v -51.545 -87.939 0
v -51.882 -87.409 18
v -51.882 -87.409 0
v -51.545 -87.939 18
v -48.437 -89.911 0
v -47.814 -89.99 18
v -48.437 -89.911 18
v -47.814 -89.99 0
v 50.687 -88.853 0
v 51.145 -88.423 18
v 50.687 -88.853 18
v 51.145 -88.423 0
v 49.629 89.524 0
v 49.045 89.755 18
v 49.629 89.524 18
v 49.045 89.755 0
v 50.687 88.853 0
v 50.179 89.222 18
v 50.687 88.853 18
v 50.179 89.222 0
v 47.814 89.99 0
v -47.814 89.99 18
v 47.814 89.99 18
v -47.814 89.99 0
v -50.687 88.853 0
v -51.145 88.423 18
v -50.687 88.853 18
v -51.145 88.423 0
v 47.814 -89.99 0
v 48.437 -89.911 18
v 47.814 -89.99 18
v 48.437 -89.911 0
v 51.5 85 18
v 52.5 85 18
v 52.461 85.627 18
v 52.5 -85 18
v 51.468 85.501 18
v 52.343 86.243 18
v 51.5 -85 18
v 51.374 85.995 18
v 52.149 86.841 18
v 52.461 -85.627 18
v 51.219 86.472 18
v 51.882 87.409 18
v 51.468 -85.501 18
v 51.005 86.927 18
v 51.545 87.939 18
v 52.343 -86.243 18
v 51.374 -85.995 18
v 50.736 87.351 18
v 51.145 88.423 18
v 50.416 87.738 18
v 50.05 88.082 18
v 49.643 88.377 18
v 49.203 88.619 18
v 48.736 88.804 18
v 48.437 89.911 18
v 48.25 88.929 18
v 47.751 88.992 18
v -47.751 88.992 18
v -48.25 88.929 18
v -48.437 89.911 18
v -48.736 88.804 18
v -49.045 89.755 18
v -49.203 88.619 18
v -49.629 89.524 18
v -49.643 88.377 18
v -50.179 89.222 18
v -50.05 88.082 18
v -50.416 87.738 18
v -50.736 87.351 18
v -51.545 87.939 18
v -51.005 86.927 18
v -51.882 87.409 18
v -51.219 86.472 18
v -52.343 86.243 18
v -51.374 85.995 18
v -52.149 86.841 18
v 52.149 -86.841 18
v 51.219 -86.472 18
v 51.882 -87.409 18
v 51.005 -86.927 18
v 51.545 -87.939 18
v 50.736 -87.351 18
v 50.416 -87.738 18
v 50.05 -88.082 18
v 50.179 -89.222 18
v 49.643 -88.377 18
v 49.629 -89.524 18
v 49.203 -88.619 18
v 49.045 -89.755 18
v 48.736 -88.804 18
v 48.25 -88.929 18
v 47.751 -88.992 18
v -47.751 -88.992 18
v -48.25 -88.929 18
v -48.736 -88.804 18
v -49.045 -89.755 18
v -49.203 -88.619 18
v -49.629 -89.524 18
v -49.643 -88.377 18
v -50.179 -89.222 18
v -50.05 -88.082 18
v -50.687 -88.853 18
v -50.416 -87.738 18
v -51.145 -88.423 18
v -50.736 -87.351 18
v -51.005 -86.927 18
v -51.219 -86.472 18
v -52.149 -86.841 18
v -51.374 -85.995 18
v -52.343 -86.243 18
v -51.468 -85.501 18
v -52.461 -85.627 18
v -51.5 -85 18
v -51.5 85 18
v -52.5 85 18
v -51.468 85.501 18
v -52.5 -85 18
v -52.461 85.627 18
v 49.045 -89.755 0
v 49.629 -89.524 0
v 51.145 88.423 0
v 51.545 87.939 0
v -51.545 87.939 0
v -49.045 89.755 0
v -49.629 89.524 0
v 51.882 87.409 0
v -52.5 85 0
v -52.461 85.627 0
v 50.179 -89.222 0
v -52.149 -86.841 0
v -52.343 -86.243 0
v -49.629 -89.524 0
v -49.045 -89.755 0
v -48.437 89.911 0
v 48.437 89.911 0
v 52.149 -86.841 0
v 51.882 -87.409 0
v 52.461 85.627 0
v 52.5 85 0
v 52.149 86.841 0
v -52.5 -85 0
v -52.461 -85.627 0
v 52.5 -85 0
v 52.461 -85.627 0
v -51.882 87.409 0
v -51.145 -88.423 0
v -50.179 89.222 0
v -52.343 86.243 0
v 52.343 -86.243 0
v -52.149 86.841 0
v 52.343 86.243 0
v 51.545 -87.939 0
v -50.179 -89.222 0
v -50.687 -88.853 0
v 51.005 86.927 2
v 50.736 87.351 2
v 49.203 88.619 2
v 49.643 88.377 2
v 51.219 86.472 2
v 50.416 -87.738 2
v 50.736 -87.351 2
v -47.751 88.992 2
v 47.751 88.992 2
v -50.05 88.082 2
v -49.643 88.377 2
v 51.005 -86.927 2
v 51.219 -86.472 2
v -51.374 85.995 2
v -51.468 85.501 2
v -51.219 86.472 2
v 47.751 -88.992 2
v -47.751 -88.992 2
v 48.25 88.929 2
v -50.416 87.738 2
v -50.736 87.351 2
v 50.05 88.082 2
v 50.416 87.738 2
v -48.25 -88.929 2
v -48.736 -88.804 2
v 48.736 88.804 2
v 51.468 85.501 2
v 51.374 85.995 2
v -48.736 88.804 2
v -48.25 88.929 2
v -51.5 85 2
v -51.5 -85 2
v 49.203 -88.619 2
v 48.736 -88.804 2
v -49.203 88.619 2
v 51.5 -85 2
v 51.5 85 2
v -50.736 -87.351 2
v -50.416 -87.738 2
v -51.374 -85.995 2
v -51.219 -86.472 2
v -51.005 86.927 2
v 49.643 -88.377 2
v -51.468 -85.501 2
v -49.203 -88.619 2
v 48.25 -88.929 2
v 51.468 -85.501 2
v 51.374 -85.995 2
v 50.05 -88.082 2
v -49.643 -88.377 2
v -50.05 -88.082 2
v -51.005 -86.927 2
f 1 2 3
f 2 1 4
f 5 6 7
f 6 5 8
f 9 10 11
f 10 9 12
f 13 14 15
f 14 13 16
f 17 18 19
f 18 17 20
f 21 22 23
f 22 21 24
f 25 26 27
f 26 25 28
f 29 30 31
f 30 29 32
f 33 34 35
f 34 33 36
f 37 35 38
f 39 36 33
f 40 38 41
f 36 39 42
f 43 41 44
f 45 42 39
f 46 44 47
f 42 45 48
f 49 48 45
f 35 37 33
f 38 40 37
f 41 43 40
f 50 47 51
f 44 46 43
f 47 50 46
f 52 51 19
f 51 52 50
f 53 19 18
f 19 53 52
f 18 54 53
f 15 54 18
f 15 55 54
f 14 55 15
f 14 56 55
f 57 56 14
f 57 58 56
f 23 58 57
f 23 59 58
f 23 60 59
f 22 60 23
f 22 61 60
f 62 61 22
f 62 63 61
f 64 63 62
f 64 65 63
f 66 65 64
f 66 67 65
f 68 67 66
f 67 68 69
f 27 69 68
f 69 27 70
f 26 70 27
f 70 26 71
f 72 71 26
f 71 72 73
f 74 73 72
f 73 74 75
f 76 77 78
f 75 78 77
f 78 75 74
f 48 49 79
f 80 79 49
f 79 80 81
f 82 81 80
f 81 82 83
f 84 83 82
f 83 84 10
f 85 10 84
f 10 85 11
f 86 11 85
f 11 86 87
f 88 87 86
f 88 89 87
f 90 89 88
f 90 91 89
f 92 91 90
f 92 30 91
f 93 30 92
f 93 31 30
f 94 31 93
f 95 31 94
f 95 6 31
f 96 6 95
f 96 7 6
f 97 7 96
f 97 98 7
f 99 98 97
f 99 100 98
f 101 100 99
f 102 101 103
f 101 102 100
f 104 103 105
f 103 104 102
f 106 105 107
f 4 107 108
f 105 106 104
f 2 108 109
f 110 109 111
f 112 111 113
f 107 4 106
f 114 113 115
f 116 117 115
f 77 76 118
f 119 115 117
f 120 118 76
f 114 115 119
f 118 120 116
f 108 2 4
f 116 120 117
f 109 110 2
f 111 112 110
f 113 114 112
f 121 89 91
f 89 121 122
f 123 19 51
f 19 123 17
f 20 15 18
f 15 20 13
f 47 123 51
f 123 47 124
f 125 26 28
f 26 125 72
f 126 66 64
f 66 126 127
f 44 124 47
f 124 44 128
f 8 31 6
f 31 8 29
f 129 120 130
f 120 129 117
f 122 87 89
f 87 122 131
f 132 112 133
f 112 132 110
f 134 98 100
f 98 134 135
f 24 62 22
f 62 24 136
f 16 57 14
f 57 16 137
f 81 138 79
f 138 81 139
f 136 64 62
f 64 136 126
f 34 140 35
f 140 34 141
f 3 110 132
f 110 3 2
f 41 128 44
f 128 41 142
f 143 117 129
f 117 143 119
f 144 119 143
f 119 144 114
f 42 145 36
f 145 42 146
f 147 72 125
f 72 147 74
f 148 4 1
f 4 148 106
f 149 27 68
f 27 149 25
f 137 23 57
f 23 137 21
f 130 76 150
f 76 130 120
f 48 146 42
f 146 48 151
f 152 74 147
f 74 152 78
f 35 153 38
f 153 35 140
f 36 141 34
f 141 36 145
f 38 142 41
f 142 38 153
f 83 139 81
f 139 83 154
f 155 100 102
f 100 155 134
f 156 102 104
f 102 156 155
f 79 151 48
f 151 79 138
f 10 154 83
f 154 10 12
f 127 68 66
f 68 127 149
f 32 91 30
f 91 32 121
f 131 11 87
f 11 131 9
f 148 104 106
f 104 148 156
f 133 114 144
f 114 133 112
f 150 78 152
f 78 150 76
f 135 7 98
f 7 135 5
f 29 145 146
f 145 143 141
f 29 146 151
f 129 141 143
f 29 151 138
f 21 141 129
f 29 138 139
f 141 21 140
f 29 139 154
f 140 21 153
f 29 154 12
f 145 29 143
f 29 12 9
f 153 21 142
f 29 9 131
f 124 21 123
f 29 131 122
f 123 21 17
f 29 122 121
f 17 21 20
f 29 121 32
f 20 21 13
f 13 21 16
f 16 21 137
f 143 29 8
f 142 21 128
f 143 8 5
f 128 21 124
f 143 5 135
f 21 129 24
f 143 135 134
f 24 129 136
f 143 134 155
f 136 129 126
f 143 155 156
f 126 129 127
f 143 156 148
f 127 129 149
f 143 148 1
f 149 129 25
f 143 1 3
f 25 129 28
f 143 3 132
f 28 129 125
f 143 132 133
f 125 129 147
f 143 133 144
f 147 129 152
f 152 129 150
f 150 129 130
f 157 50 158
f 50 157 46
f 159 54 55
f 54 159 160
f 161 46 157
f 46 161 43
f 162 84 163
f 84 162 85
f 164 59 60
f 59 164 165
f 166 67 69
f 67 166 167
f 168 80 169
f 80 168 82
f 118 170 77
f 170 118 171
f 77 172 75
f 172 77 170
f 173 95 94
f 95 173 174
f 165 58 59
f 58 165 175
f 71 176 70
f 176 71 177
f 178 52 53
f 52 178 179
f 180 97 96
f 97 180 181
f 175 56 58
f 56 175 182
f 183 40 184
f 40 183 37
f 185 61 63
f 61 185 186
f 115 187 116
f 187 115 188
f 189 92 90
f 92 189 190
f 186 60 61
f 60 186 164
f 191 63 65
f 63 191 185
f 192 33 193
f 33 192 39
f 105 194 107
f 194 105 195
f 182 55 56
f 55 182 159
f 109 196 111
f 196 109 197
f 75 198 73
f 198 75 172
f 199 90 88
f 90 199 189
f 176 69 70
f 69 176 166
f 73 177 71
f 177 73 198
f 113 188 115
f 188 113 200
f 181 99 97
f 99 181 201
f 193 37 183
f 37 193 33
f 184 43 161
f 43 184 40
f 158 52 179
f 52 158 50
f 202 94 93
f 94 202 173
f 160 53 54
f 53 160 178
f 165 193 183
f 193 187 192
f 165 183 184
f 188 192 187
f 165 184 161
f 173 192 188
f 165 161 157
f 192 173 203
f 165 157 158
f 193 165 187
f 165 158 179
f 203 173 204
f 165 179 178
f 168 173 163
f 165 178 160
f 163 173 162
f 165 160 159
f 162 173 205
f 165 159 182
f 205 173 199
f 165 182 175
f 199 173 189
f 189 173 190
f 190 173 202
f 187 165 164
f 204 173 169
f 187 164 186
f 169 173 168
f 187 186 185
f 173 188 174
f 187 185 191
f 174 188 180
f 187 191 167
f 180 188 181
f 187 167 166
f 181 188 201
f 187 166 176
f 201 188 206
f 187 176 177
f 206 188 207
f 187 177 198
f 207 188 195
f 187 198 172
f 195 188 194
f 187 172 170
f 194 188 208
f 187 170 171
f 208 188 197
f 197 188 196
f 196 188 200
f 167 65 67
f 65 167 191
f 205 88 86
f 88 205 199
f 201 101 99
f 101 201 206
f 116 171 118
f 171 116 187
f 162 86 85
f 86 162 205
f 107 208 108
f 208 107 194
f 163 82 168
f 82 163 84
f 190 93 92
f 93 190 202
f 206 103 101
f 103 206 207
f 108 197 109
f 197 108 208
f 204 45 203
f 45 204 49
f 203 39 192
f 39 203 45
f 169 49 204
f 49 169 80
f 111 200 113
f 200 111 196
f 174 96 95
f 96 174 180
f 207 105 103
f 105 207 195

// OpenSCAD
$fn = 50;


difference() {
	union() {
		hull() {
			translate(v = [-47.5000000000, 85.0000000000, 0]) {
				cylinder(h = 18, r = 5);
			}
			translate(v = [47.5000000000, 85.0000000000, 0]) {
				cylinder(h = 18, r = 5);
			}
			translate(v = [-47.5000000000, -85.0000000000, 0]) {
				cylinder(h = 18, r = 5);
			}
			translate(v = [47.5000000000, -85.0000000000, 0]) {
				cylinder(h = 18, r = 5);
			}
		}
	}
	union() {
		translate(v = [0, 0, 2]) {
			hull() {
				translate(v = [-47.5000000000, 85.0000000000, 0]) {
					cylinder(h = 16, r = 4);
				}
				translate(v = [47.5000000000, 85.0000000000, 0]) {
					cylinder(h = 16, r = 4);
				}
				translate(v = [-47.5000000000, -85.0000000000, 0]) {
					cylinder(h = 16, r = 4);
				}
				translate(v = [47.5000000000, -85.0000000000, 0]) {
					cylinder(h = 16, r = 4);
				}
			}
		}
	}
}
